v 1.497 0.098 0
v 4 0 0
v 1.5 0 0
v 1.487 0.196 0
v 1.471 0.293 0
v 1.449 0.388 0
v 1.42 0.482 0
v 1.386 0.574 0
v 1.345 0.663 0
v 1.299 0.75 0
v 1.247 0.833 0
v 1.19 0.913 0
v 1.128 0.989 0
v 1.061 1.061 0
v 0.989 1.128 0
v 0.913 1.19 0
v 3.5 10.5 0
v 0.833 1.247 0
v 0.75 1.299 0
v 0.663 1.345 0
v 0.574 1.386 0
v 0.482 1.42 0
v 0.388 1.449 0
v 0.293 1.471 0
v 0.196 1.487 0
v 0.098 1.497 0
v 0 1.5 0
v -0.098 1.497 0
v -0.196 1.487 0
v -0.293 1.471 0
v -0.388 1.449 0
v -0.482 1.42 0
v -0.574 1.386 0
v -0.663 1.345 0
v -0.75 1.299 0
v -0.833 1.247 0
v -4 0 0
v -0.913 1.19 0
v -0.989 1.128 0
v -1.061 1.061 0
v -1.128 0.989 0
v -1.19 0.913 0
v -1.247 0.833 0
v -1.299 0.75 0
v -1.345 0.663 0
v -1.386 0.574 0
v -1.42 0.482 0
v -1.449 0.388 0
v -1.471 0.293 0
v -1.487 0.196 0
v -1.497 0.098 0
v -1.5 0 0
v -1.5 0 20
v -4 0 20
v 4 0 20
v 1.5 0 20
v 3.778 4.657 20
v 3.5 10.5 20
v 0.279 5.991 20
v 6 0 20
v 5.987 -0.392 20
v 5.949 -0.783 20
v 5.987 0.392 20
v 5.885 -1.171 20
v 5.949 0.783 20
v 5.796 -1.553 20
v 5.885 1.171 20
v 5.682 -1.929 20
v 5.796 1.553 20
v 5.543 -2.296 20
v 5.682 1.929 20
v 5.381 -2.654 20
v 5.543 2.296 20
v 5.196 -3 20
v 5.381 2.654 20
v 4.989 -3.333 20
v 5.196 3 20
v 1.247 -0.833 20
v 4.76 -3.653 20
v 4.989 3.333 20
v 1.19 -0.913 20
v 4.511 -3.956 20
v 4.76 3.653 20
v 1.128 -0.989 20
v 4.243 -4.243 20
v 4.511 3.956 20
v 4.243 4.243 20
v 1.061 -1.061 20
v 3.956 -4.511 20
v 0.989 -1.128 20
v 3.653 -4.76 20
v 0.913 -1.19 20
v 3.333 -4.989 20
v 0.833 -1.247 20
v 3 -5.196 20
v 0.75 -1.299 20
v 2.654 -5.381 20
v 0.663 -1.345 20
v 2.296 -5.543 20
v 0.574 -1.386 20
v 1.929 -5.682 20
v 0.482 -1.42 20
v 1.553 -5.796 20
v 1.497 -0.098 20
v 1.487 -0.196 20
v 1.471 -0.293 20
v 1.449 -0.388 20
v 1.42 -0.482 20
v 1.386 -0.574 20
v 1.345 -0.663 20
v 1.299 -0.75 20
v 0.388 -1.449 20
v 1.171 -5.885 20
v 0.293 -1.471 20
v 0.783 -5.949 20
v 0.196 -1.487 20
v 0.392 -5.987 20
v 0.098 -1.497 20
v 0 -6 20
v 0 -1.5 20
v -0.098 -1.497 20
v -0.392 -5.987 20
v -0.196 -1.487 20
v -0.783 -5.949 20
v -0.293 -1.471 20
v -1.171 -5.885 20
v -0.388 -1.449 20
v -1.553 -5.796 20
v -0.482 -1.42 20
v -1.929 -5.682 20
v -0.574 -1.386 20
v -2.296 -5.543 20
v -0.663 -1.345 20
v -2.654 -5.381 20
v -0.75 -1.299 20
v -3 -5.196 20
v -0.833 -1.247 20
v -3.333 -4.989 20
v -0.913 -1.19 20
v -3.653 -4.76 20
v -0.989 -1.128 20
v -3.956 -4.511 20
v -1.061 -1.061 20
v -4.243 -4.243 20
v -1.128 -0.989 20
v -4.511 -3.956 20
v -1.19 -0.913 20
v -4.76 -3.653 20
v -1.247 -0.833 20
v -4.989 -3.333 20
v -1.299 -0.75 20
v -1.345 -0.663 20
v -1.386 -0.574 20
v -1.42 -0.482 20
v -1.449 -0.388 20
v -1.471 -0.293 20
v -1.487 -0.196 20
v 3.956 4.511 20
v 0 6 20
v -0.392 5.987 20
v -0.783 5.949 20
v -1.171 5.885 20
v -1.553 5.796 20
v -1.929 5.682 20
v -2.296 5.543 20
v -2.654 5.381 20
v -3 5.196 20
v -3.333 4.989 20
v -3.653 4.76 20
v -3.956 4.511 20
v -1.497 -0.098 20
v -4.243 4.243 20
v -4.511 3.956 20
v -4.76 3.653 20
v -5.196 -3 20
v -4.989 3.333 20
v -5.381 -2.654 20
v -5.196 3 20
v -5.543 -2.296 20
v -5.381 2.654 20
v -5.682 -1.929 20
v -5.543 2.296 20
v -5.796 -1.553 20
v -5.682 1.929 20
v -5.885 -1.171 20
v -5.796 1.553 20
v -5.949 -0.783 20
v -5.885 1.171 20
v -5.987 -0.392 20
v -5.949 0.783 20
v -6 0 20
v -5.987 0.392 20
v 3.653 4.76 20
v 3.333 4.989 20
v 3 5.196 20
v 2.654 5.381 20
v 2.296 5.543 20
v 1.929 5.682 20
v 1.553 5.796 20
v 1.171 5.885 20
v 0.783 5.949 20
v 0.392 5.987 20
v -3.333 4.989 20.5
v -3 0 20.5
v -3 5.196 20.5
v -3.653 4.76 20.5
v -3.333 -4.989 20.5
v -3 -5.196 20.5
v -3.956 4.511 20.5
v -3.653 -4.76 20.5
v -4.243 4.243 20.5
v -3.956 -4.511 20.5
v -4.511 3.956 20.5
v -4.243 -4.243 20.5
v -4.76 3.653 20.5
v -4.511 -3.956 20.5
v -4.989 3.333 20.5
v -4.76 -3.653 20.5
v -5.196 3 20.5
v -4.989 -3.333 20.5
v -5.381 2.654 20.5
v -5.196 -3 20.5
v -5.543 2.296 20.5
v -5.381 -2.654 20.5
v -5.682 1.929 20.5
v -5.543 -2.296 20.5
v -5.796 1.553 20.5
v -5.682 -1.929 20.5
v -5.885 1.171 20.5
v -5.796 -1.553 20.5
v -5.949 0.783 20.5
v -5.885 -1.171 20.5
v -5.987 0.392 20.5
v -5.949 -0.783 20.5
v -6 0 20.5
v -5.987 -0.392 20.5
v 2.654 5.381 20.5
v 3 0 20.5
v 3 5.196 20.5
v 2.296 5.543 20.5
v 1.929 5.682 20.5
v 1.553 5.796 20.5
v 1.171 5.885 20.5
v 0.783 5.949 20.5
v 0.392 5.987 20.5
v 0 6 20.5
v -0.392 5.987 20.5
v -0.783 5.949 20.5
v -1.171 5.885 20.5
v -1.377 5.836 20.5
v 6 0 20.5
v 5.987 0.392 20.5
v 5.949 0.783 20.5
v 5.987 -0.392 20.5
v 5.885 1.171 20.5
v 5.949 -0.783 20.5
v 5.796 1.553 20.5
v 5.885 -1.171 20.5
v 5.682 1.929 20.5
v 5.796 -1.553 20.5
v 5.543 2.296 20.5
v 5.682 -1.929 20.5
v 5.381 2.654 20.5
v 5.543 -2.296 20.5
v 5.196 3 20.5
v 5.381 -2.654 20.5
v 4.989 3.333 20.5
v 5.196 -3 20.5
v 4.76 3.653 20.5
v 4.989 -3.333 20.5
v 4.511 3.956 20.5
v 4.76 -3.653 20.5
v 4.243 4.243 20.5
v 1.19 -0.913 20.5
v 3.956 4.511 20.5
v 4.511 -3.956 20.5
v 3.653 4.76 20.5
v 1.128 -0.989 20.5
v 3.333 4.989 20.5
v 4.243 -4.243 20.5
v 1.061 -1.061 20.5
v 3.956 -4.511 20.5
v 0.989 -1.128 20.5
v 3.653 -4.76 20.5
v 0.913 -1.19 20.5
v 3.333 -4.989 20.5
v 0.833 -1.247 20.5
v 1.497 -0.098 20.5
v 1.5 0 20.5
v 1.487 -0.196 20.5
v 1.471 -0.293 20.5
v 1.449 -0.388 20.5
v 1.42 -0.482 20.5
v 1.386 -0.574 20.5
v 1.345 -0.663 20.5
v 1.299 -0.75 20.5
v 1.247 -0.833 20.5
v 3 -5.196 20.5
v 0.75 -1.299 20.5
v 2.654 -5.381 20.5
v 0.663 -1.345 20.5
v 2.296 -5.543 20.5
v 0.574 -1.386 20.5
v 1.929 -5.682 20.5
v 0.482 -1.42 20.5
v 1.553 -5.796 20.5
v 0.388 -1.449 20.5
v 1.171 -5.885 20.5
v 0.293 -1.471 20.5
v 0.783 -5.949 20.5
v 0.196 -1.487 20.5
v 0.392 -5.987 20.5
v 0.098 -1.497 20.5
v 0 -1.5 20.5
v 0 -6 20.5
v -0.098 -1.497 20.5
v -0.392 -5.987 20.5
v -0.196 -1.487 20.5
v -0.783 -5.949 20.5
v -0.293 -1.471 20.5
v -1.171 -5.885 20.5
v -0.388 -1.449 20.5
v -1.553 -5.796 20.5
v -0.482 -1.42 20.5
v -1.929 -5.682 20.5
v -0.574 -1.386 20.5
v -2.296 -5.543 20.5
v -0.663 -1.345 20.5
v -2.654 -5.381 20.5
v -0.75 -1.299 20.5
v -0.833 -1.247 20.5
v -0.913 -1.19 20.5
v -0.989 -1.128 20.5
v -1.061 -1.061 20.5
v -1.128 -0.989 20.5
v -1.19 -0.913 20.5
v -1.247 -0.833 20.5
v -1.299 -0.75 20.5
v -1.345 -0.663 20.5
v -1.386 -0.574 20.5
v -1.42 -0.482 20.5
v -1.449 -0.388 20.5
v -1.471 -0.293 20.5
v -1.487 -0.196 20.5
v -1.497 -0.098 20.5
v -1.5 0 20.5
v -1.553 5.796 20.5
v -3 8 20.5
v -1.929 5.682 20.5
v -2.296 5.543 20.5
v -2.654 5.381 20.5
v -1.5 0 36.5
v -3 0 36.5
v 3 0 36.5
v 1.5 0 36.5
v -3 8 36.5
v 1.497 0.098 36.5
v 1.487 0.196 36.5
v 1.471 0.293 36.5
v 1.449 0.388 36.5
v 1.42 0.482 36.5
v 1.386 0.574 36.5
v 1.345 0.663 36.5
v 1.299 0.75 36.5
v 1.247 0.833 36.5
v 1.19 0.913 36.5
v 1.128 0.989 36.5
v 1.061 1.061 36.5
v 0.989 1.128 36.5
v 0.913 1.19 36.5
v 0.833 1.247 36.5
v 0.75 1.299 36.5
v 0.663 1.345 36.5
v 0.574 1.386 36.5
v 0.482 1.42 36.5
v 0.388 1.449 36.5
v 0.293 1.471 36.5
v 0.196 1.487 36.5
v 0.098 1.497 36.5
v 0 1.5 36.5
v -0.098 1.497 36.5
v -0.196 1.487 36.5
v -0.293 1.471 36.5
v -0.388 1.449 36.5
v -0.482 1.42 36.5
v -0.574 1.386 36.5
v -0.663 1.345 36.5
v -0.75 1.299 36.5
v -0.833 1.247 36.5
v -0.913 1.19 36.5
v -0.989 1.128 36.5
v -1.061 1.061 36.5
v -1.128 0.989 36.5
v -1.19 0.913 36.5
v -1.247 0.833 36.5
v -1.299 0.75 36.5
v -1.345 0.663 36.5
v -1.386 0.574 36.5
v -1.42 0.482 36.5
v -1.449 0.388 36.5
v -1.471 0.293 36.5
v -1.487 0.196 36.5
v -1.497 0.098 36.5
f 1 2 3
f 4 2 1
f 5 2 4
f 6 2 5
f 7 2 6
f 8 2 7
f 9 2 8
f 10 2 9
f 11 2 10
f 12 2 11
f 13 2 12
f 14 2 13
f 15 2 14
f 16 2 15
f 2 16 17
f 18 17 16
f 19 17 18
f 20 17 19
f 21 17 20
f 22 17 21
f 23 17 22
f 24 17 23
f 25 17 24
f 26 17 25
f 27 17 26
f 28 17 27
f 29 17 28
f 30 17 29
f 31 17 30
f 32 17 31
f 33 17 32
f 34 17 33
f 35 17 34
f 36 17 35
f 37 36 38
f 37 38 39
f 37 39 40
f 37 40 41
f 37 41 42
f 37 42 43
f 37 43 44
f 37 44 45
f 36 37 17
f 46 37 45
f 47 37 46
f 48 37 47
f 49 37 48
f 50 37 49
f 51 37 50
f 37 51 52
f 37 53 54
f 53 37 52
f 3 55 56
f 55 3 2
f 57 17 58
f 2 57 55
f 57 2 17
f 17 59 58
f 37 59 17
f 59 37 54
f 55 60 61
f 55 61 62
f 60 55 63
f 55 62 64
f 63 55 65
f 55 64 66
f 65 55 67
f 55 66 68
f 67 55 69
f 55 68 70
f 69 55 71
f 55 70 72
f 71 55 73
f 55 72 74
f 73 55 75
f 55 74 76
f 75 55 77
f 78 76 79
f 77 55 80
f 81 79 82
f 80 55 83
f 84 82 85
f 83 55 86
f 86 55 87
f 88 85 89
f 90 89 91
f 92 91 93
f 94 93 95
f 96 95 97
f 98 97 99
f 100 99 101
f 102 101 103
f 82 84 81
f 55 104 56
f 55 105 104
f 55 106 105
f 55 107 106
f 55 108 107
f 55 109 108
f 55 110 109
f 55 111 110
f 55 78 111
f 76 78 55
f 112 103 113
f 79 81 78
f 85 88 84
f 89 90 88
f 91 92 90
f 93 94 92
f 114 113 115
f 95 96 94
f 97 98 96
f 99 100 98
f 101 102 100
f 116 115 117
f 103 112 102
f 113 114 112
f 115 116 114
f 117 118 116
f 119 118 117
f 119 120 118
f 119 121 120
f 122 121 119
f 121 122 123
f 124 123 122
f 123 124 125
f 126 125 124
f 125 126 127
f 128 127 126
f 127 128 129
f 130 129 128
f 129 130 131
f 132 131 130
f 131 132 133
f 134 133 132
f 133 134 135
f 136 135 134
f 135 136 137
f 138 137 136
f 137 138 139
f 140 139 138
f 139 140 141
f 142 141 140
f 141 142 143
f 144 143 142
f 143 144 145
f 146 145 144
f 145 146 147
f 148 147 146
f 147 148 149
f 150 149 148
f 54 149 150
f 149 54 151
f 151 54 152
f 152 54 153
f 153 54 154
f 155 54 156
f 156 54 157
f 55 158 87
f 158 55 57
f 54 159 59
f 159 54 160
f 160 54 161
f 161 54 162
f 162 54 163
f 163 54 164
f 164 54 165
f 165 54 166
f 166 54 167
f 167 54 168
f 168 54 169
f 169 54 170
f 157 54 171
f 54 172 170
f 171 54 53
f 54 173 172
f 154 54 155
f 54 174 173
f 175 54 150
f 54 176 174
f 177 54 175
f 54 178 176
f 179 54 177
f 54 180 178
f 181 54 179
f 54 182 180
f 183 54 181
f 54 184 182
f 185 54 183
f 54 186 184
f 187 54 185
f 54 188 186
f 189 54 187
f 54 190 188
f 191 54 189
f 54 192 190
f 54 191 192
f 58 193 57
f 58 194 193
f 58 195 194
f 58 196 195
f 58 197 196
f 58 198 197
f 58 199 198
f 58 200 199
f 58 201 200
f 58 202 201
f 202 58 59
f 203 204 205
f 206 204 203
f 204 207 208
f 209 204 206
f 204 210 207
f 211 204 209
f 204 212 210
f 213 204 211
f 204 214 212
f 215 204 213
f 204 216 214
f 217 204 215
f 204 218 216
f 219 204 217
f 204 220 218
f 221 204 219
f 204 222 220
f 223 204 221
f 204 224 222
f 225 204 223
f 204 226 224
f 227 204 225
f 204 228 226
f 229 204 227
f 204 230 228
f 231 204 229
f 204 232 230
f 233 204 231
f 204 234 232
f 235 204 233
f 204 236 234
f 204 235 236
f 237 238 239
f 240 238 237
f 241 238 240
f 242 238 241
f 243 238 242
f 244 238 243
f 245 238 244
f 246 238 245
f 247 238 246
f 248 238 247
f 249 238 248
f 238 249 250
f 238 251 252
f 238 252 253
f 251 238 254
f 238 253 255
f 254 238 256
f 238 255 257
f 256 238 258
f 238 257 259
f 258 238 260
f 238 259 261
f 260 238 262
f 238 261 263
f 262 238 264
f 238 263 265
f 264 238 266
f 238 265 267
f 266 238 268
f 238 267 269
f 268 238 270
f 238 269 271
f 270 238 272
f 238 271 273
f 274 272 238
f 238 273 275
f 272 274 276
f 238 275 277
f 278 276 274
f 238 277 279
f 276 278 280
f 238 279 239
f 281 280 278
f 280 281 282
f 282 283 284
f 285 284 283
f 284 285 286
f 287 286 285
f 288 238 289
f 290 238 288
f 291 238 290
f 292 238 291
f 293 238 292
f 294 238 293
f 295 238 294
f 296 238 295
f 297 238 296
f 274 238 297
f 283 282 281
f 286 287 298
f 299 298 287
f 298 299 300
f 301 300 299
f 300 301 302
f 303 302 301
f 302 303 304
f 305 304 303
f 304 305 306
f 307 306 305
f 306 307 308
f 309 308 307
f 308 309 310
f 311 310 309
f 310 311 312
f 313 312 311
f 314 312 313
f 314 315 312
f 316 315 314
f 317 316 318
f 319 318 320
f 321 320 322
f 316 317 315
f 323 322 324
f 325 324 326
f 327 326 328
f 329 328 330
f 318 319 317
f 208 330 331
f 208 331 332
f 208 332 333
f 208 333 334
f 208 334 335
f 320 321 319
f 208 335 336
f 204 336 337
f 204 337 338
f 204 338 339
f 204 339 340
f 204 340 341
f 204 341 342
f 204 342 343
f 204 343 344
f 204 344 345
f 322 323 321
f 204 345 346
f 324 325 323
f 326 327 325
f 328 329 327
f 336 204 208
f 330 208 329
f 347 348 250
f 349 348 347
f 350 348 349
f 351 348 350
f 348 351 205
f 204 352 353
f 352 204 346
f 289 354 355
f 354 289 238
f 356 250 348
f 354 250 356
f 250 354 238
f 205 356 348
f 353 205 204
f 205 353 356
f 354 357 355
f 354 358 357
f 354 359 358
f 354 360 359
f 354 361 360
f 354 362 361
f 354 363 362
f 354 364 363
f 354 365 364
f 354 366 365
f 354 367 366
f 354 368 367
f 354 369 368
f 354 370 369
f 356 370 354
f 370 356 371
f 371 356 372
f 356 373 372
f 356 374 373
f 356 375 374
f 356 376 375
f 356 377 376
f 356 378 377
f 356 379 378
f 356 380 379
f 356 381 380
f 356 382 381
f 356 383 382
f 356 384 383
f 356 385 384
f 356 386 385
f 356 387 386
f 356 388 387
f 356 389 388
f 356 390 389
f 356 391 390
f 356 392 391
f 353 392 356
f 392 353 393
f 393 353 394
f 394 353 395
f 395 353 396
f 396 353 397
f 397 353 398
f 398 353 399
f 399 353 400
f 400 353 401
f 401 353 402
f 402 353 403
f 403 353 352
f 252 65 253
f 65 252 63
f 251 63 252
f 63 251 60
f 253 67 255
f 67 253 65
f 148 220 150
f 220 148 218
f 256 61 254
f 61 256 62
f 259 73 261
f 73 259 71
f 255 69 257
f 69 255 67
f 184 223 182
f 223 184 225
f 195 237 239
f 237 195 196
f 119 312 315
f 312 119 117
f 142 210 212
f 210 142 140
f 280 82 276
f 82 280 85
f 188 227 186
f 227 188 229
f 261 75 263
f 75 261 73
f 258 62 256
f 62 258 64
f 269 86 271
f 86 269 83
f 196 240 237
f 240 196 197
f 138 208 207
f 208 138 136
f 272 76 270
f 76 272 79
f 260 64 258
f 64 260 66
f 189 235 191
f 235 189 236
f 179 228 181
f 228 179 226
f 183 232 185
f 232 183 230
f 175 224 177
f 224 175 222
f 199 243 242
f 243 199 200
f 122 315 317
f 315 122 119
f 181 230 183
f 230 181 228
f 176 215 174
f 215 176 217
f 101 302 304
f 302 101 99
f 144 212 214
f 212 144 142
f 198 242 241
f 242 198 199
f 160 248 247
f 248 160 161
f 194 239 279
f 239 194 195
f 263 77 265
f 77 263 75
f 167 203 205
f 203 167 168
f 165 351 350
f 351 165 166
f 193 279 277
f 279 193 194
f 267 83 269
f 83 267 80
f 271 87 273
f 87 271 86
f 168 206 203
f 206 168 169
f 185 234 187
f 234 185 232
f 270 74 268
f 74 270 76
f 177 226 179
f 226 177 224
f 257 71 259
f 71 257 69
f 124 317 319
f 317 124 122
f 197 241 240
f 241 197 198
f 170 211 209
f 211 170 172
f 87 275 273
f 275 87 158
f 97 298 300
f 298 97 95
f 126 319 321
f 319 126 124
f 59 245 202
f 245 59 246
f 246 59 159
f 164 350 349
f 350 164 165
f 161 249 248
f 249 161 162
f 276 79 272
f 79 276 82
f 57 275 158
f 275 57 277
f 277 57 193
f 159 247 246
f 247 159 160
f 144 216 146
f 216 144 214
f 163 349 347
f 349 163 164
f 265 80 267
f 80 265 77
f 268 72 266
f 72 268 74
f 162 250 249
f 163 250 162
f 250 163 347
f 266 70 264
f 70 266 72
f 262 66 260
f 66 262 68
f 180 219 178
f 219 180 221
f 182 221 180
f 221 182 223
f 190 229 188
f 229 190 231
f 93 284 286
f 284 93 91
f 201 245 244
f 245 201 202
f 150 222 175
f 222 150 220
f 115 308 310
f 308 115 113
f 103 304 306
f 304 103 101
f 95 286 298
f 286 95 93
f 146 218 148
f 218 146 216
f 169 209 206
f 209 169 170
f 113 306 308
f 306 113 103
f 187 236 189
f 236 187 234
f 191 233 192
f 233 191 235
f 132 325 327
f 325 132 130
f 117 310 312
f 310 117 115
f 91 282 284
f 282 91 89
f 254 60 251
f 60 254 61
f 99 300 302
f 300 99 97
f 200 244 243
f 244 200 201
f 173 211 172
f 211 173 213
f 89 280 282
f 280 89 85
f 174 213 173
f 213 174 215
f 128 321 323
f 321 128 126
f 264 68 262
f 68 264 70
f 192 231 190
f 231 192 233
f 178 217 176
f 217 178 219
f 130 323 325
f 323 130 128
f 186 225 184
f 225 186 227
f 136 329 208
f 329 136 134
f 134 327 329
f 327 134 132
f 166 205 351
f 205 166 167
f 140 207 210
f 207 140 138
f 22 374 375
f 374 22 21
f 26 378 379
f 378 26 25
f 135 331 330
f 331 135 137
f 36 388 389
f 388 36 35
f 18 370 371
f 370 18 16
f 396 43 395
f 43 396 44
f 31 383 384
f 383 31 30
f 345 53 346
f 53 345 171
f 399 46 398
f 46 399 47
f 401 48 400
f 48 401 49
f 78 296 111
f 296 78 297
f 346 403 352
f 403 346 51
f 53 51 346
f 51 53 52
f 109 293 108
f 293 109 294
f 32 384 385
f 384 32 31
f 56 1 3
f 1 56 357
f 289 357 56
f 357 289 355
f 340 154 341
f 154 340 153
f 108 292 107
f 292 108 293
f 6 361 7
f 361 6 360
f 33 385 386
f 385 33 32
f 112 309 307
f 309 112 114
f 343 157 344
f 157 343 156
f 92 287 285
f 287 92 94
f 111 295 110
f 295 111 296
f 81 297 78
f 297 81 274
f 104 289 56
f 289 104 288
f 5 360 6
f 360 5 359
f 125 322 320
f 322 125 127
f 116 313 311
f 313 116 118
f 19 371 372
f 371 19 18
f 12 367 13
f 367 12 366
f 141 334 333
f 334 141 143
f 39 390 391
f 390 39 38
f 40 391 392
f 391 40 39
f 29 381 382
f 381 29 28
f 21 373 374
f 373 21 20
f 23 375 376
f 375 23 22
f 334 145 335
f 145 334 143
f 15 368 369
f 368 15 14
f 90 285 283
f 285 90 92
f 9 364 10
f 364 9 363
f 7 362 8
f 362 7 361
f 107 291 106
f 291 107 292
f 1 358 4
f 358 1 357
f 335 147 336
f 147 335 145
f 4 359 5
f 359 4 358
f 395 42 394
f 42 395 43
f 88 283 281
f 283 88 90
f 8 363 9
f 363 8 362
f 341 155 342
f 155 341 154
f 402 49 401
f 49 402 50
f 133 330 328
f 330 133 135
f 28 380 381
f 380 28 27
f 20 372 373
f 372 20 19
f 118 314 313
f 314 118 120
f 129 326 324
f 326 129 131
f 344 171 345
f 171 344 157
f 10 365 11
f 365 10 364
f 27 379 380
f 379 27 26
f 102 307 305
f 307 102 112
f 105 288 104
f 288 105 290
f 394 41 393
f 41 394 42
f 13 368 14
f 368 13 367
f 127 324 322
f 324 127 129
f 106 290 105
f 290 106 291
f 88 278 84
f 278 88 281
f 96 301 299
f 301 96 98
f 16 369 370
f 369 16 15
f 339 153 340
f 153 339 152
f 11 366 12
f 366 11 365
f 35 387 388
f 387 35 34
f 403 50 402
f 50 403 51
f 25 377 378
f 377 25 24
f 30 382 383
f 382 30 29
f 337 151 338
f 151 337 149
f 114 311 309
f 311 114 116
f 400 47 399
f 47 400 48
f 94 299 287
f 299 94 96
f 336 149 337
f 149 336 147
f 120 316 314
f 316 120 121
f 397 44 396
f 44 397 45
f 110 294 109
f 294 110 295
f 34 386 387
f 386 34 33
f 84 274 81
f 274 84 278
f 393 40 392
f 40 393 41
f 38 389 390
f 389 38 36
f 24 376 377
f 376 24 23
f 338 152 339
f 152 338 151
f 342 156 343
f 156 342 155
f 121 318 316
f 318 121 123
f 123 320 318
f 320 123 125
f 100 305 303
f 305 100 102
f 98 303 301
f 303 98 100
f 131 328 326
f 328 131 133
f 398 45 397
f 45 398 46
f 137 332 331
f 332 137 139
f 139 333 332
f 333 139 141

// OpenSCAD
// Hose-barb reducer: 8 mm tubing (z = 0..20) -> 5 mm tubing (z = 25..41)
// Print orientation: standing upright along +Z, centred on the origin in X/Y.
// Units: mm. Bore: 3 mm through the full length.

// ---------------- Parameters ----------------
reducer_in_d     = 8;    // inlet tubing inner diameter
reducer_out_d    = 5;    // outlet tubing inner diameter
reducer_bore_d   = 3;    // through-bore diameter
reducer_barb_n   = 2;    // number of barbs per end (stacked)
reducer_len_in   = 20;   // inlet section length (z = 0..20)
reducer_len_out  = 16;   // outlet section length (z = 25..41)
reducer_collar_d = 12;   // intermediate collar diameter (z = 20..25)
reducer_overlap  = 0.5;  // overlap/step depth so adjacent shapes fuse cleanly

$fn = 96;                // curve resolution

// ---------------- Derived ----------------
in_r      = reducer_in_d / 2;      // 4.0
out_r     = reducer_out_d / 2;     // 2.5
collar_r  = reducer_collar_d / 2;  // 6.0
total_h   = reducer_len_in + reducer_len_out + reducer_overlap;  // 41.5 (extends past the last face)

// ---------------- Model ----------------
difference() {
    union() {
        // Inlet barbs with sawtooth profile (z = 0..20)
        for (i = [0 : reducer_barb_n - 1]) {
            translate([0, 0, i * reducer_len_in / reducer_barb_n])
                linear_extrude(height = reducer_len_in / reducer_barb_n)
                    polygon([
                        [-in_r, 0],
                        [ in_r, 0],
                        [ (in_r - reducer_overlap),
                          reducer_len_in / reducer_barb_n + reducer_overlap ]
                    ]);
        }

        // Outlet barbs with shrinking profile (z = 25..41)
        for (i = [0 : reducer_barb_n - 1]) {
            translate([0, 0, reducer_len_in + reducer_overlap + i * reducer_len_out / reducer_barb_n])
                linear_extrude(height = reducer_len_out / reducer_barb_n)
                    polygon([
                        [out_r + reducer_overlap, 0],
                        [-out_r - reducer_overlap, 0],
                        [ -out_r - reducer_overlap,
                          reducer_len_out / reducer_barb_n ]
                    ]);
        }

        // Collar (z = 20..25)
        translate([0, 0, reducer_len_in])
            cylinder(h = reducer_overlap, r = collar_r);
    }

    // Through-bore (extends past both end faces)
    translate([0, 0, -1])
        cylinder(h = total_h + 2, d = reducer_bore_d);
}
